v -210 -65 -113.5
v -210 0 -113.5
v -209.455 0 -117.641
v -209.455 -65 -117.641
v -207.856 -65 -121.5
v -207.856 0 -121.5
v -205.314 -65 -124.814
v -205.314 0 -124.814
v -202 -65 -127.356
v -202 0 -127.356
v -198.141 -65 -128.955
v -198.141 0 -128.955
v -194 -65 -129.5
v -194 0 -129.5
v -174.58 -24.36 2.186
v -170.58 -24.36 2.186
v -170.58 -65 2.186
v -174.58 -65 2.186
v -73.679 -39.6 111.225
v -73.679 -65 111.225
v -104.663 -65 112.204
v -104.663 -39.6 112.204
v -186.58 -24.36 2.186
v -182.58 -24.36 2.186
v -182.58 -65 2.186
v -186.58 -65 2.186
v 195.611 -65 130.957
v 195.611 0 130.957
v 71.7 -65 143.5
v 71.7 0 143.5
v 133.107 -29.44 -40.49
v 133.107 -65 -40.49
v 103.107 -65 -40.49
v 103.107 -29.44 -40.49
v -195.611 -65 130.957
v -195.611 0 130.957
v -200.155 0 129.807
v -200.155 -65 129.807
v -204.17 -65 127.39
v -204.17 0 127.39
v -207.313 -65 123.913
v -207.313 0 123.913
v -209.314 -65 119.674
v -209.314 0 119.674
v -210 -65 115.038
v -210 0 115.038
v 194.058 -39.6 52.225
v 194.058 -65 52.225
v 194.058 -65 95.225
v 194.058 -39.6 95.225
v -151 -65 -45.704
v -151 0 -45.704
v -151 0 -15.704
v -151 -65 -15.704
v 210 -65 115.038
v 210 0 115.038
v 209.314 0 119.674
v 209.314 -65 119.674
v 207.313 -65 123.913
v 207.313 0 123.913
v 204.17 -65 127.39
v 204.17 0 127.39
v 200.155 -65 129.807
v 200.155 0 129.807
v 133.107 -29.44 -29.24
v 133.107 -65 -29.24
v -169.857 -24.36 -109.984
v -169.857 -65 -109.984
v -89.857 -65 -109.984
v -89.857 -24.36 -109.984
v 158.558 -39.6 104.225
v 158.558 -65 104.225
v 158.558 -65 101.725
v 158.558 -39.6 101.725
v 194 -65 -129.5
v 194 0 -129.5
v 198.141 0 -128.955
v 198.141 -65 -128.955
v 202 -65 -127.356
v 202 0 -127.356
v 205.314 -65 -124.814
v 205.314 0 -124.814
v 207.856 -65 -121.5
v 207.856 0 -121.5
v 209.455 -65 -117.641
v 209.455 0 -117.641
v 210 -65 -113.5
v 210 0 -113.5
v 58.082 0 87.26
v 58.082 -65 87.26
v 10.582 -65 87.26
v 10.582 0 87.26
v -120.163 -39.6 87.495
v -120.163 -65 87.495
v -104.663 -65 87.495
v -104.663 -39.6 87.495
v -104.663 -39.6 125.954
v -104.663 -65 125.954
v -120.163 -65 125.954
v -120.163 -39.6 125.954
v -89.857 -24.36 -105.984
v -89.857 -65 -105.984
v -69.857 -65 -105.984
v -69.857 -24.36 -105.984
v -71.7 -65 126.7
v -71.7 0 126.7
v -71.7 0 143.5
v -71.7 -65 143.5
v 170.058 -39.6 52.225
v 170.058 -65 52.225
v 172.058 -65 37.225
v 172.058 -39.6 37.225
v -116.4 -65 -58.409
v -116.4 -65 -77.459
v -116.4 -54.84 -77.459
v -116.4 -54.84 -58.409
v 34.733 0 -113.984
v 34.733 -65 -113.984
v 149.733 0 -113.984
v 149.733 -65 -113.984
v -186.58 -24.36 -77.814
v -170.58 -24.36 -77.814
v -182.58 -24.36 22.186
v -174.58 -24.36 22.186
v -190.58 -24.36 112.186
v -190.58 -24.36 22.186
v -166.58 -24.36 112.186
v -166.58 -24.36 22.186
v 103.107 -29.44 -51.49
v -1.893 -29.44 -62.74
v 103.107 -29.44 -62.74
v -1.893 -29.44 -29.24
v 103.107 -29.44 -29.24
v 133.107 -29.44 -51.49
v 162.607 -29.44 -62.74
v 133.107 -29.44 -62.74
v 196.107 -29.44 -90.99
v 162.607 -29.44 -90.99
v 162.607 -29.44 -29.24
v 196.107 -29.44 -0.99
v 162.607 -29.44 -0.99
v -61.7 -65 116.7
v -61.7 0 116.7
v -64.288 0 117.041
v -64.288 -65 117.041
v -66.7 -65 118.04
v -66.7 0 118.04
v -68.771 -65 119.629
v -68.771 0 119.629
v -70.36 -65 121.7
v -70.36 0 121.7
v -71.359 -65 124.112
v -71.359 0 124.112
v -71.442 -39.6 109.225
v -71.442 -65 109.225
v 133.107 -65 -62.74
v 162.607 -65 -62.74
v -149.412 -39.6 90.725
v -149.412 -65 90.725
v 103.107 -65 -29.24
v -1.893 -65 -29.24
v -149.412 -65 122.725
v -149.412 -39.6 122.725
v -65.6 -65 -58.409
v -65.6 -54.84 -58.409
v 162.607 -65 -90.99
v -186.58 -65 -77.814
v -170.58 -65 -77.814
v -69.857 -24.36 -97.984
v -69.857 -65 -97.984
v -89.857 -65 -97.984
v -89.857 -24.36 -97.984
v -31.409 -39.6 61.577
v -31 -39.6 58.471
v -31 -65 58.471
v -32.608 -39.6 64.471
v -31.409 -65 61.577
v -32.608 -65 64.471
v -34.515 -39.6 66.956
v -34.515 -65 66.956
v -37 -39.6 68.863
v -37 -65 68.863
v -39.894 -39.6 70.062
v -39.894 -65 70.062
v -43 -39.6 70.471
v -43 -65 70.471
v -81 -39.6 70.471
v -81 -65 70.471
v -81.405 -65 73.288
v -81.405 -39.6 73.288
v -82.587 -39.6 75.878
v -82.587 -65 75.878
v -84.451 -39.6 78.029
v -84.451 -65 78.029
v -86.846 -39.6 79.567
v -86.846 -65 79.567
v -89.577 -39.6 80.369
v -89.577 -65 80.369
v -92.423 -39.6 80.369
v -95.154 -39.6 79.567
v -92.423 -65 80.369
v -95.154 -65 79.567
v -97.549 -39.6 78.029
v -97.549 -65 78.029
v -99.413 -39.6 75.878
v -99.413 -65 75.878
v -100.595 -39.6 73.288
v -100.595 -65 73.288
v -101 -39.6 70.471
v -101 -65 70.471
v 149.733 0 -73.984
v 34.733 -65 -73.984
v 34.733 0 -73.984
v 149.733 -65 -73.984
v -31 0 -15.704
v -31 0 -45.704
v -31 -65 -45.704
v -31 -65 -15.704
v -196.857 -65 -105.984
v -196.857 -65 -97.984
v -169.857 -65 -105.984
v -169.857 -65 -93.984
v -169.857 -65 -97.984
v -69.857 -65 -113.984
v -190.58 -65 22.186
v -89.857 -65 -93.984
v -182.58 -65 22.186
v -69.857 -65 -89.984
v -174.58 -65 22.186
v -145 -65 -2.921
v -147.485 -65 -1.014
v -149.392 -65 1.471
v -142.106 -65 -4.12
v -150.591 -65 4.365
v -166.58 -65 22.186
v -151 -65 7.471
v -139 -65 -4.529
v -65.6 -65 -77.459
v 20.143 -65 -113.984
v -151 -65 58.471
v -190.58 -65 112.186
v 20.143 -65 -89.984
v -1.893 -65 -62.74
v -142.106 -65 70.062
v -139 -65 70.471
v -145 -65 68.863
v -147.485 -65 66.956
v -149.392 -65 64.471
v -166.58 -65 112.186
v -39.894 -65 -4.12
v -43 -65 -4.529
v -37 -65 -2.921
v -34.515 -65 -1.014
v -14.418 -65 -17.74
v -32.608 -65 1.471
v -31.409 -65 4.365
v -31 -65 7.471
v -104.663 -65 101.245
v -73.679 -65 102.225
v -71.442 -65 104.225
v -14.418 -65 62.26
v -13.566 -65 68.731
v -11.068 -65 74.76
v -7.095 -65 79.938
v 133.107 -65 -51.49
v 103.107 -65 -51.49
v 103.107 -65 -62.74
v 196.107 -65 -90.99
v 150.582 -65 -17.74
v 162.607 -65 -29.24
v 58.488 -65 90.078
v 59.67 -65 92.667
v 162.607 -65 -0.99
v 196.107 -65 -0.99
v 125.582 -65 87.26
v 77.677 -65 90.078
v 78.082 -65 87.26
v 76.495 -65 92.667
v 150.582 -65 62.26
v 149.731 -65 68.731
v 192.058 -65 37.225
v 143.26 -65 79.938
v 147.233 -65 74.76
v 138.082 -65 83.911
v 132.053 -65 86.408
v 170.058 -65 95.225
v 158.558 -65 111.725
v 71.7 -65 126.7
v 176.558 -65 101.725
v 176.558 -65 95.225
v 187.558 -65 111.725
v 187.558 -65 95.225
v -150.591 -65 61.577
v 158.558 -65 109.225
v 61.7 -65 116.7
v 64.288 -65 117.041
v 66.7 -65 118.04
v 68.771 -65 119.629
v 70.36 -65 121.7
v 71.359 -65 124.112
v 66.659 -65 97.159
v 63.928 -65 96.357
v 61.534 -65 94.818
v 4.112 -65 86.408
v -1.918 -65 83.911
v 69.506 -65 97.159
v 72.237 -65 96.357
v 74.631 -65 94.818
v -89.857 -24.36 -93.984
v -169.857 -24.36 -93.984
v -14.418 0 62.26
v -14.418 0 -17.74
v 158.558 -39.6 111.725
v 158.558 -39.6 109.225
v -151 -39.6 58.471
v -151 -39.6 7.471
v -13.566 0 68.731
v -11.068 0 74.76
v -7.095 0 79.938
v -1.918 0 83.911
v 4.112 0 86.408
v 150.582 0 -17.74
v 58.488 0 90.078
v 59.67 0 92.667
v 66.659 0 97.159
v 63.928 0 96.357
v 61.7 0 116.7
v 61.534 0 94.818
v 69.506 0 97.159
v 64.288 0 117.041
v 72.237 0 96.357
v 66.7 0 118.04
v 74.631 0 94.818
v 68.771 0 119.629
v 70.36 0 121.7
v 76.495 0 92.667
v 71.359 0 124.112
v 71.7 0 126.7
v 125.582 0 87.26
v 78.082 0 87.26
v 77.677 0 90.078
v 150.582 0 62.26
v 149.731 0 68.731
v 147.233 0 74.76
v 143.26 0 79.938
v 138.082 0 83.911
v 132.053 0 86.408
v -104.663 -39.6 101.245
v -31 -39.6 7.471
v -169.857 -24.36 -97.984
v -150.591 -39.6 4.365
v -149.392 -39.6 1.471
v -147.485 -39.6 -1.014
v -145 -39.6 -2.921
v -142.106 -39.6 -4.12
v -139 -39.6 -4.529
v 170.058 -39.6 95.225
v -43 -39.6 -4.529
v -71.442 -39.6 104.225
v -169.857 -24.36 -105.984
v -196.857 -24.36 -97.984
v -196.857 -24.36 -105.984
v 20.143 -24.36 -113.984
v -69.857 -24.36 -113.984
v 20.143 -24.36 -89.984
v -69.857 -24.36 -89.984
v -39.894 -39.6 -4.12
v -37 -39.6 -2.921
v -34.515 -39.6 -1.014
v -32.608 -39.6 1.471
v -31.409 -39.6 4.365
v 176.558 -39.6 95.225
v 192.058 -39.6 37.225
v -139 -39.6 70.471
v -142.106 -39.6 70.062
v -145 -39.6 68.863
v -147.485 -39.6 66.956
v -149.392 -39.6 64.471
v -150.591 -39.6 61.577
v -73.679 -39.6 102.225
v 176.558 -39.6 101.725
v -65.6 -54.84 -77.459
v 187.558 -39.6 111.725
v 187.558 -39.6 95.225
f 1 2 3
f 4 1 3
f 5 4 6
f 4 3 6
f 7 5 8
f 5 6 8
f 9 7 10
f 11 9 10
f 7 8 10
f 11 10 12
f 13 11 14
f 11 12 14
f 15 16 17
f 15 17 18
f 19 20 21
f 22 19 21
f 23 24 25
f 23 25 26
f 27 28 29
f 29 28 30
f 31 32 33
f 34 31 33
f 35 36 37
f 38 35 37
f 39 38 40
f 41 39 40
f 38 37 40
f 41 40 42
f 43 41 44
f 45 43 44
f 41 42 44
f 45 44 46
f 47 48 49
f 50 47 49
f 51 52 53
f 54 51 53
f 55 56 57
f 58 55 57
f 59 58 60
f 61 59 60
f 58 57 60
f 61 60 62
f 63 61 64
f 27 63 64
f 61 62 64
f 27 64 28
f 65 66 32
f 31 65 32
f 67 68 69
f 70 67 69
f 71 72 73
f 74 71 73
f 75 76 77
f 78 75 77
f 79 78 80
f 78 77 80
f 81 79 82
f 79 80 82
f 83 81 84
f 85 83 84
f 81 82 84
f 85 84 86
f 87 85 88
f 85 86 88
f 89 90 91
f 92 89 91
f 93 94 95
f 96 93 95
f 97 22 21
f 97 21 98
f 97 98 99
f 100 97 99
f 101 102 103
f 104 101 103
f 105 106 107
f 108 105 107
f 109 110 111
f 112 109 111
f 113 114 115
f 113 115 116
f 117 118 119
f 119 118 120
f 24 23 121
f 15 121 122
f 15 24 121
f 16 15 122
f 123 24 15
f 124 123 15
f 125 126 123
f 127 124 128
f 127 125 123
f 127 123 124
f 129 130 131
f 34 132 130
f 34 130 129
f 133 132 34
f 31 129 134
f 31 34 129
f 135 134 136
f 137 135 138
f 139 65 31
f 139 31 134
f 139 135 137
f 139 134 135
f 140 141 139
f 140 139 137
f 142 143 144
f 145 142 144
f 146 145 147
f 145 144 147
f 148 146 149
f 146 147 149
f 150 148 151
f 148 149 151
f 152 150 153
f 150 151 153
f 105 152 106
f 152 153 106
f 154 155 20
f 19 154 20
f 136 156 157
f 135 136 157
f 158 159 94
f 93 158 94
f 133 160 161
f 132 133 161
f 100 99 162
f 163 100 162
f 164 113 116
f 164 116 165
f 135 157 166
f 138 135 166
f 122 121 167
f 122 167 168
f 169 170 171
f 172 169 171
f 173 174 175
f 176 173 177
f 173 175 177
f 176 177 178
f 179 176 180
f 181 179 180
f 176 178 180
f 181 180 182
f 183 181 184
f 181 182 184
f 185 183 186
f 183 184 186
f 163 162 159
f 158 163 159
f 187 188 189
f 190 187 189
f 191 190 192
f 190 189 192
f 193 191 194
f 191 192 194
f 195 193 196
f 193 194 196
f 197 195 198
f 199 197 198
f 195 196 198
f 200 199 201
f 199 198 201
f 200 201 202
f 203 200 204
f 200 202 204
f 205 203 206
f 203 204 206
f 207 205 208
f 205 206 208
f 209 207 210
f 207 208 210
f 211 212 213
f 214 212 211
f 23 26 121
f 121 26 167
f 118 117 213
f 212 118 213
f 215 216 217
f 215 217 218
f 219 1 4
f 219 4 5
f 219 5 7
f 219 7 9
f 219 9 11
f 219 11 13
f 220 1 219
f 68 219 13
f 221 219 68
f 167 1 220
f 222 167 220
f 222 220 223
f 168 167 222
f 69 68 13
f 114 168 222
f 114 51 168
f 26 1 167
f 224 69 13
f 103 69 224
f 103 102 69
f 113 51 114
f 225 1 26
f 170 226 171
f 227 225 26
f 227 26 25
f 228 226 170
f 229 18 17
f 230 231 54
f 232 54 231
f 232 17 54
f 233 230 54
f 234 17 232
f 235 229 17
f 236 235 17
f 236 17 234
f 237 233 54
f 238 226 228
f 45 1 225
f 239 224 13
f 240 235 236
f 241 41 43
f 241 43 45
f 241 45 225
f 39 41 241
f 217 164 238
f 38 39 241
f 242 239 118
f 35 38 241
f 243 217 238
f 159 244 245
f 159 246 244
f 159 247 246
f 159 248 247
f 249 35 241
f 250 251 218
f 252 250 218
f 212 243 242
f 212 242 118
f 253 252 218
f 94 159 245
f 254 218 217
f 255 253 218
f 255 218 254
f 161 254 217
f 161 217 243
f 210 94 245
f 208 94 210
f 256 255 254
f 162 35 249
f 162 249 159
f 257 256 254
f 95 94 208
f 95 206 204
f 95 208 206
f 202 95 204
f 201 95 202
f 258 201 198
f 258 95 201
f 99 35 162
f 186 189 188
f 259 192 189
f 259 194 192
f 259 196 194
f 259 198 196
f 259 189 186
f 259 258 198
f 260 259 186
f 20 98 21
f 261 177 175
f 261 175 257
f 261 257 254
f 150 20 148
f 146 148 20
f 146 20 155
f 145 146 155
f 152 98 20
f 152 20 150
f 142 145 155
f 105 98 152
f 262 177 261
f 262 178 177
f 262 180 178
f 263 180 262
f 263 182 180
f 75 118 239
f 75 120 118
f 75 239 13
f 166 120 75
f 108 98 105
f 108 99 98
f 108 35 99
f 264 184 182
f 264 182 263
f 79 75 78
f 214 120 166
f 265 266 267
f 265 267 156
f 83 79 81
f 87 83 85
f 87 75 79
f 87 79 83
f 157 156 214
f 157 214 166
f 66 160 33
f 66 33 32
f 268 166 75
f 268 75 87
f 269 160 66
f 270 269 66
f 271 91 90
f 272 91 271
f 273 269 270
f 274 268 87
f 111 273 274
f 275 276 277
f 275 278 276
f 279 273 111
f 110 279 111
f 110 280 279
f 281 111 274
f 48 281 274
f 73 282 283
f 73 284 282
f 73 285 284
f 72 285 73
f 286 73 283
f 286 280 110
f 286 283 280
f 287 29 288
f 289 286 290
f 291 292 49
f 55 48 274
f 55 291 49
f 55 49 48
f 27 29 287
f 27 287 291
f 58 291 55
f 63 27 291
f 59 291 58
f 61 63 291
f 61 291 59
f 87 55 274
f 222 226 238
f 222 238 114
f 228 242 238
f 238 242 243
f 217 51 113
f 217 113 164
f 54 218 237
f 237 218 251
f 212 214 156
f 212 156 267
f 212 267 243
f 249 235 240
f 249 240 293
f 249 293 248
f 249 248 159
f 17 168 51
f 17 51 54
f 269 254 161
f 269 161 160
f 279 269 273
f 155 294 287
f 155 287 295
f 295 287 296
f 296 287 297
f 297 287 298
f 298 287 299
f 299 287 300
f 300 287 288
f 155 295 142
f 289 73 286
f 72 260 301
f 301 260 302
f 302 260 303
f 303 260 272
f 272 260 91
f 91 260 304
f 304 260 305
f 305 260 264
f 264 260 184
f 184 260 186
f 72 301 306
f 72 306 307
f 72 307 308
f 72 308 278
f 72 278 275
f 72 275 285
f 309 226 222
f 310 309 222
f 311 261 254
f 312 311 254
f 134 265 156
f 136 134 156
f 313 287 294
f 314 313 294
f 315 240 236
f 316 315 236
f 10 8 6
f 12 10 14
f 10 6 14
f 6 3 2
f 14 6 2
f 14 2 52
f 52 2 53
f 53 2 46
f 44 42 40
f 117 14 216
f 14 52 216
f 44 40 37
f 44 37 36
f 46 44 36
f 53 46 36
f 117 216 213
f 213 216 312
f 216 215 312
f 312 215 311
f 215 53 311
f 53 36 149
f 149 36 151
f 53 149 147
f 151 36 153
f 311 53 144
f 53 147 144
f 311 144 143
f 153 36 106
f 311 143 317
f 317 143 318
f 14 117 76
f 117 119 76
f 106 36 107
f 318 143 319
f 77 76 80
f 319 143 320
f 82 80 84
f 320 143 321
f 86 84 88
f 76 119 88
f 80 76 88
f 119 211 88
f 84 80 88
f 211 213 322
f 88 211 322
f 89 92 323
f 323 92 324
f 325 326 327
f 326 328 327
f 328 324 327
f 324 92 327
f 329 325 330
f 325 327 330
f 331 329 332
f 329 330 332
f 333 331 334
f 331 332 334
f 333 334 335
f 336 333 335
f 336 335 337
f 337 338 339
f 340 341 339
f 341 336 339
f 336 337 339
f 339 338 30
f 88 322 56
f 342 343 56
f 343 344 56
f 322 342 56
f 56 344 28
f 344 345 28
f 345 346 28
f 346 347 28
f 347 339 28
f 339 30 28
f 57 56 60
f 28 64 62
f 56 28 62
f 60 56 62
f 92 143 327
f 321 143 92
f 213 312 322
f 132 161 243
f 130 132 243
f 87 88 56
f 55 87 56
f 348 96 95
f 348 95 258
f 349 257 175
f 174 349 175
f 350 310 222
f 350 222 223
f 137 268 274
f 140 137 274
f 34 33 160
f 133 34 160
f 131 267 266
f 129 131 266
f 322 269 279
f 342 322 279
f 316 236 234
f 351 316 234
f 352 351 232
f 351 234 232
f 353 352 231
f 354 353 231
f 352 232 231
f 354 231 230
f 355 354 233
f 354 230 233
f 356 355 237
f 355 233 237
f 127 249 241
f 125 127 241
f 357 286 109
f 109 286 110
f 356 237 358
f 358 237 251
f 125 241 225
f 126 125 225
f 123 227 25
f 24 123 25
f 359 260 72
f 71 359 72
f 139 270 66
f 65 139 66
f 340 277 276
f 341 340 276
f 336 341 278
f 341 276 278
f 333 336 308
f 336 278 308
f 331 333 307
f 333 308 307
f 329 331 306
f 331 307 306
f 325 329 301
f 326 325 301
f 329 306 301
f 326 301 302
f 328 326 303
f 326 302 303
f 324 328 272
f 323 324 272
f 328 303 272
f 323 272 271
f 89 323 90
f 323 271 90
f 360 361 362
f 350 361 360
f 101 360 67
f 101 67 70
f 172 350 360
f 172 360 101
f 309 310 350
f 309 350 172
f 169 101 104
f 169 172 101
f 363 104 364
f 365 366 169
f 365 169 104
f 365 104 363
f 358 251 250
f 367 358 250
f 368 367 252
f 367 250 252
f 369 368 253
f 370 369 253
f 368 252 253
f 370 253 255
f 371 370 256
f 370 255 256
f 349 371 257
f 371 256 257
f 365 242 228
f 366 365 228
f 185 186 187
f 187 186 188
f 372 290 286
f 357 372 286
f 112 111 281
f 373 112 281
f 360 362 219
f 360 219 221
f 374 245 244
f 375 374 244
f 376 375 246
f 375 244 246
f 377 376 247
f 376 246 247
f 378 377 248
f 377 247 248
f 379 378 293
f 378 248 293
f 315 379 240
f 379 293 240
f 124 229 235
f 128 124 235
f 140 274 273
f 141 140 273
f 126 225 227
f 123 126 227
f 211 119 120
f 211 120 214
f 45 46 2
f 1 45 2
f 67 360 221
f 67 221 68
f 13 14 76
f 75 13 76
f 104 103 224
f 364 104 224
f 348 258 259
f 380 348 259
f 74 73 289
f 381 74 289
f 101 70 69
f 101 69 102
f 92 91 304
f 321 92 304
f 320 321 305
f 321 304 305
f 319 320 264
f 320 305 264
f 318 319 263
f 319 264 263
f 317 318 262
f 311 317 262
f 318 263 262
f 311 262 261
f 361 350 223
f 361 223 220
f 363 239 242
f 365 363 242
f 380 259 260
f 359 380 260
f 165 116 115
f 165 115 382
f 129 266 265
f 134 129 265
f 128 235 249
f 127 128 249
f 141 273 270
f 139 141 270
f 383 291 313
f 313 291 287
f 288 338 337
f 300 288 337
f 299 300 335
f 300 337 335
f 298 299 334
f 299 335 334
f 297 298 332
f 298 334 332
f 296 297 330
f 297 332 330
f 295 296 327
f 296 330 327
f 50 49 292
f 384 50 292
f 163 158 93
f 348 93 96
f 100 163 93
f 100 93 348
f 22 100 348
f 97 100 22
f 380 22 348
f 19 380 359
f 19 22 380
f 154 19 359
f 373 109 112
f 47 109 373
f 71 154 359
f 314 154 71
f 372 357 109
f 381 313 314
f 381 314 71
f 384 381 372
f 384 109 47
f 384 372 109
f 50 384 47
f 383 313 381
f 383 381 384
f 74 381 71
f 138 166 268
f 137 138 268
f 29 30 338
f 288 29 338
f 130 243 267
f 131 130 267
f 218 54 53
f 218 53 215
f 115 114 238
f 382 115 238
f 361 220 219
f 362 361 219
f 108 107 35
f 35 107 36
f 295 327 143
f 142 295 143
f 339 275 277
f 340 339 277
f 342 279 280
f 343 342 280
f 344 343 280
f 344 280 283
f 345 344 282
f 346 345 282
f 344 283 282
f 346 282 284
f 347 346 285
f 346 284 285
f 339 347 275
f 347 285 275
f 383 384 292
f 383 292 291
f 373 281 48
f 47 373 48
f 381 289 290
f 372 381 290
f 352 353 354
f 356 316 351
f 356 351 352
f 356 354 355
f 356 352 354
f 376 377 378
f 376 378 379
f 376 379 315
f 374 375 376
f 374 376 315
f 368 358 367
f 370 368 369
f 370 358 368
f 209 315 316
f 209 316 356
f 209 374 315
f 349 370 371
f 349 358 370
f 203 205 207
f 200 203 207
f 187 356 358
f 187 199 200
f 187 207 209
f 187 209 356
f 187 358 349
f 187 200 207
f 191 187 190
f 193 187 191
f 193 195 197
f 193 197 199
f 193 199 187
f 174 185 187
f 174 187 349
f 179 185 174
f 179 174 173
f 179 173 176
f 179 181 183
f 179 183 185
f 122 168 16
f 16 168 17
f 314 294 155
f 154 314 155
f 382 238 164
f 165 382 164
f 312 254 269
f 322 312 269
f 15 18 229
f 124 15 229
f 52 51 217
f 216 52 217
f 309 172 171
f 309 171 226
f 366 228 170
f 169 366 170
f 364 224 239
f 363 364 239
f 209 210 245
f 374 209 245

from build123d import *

# Parameters (mm, degrees)
F1_DEPTH  = 65
F11_DEPTH = 65.001
F12_DEPTH = 25.4
F13_DEPTH = 35.56
F9_W      = 120
F9_H      = 30
F8_W      = 115
F8_H      = 40
F14_DEPTH = 65.001
F15_DEPTH = 25.4
F16_DEPTH = 40.64
F10_W     = 50.8
F10_H     = 19.05
F17_DEPTH = 10.16


# Not quite as in the source:
# - a length typed as a fraction of an inch, garbled in the dataset ("3 / 203.2 mm" for 3/8 in), is restored


with BuildPart() as f1:
    # F0 (on Front) → F1 (new body)
    with BuildSketch(Plane.XZ):
        with BuildLine():
            Line((-194, -129.5), (0, -129.5))
            Line((0, -129.5), (194, -129.5))
            ThreePointArc((194, -129.5), (205.313708499, -124.813708499), (210, -113.5))
            Line((210, -113.5), (210, 115.0378975104))
            ThreePointArc((210, 115.0378975104), (205.8697706725, 125.76676251), (195.6114319773, 130.9565434007))
            Line((195.6114319773, 130.9565434007), (71.7, 143.5))
            Line((71.7, 143.5), (71.7, 126.7))
            ThreePointArc((71.7, 126.7), (68.7710678119, 119.6289321881), (61.7, 116.7))
            Line((61.7, 116.7), (0, 116.7))
            Line((0, 116.7), (-61.7, 116.7))
            ThreePointArc((-61.7, 116.7), (-68.7710678119, 119.6289321881), (-71.7, 126.7))
            Line((-71.7, 126.7), (-71.7, 143.5))
            Line((-71.7, 143.5), (-195.6114319773, 130.9565434007))
            ThreePointArc((-195.6114319773, 130.9565434007), (-205.8697706725, 125.76676251), (-210, 115.0378975104))
            Line((-210, 115.0378975104), (-210, -113.5))
            ThreePointArc((-210, -113.5), (-205.313708499, -124.813708499), (-194, -129.5))
        make_face()
    extrude(amount=F1_DEPTH)

    # F10 (on face) → F11 (cut, through all)
    with BuildSketch(Plane.XZ.offset(65)):
        with BuildLine():
            Line((-14.4175440073, -17.7396814525), (55.0347959064, -17.7396814525))
            Line((55.0347959064, -17.7396814525), (150.5824559927, -17.7396814525))
            Line((150.5824559927, -17.7396814525), (150.5824559927, 62.2603185475))
            ThreePointArc((150.5824559927, 62.2603185475), (143.2601255224, 79.9379880772), (125.5824559927, 87.2603185475))
            Line((125.5824559927, 87.2603185475), (78.0824559927, 87.2603185475))
            ThreePointArc((78.0824559927, 87.2603185475), (68.0824559927, 97.2603185475), (58.0824559927, 87.2603185475))
            Line((58.0824559927, 87.2603185475), (10.5824559927, 87.2603185475))
            ThreePointArc((10.5824559927, 87.2603185475), (-7.095213537, 79.9379880772), (-14.4175440073, 62.2603185475))
            Line((-14.4175440073, 62.2603185475), (-14.4175440073, -17.7396814525))
        make_face()
    extrude(amount=-F11_DEPTH, mode=Mode.SUBTRACT)

    # F3 (on face) → F12 (cut)
    with BuildSketch(Plane.XZ.offset(65)):
        with BuildLine():
            ThreePointArc((-151, 7.4711079597), (-147.4852813742, -1.0141734145), (-139, -4.5288920403))
            Line((-139, -4.5288920403), (-101.0147116184, -4.5288920403))
            Line((-101.0147116184, -4.5288920403), (-43, -4.5288920403))
            ThreePointArc((-43, -4.5288920403), (-34.5147186258, -1.0141734145), (-31, 7.4711079597))
            Line((-31, 7.4711079597), (-31, 58.4711079597))
            ThreePointArc((-31, 58.4711079597), (-34.5147186258, 66.956389334), (-43, 70.4711079597))
            Line((-43, 70.4711079597), (-81, 70.4711079597))
            ThreePointArc((-81, 70.4711079597), (-91, 80.4711079597), (-101, 70.4711079597))
            Line((-101, 70.4711079597), (-139, 70.4711079597))
            ThreePointArc((-139, 70.4711079597), (-147.4852813742, 66.956389334), (-151, 58.4711079597))
            Line((-151, 58.4711079597), (-151, 7.4711079597))
        make_face()
    extrude(amount=-F12_DEPTH, mode=Mode.SUBTRACT)

    # F4 (on face) → F13 (cut)
    with BuildSketch(Plane.XZ.offset(65)):
        Polygon((162.6070588827, -90.9896814525), (196.1070588827, -90.9896814525), (196.1070588827, -45.9896814525), (196.1070588827, -0.9896814525), (162.6070588827, -0.9896814525), (162.6070588827, -29.2396814525), (133.1070588827, -29.2396814525), (133.1070588827, -40.4896814525), (103.1070588827, -40.4896814525), (103.1070588827, -29.2396814525), (-1.8929411173, -29.2396814525), (-1.8929411173, -45.9896814525), (-1.8929411173, -62.7396814525), (103.1070588827, -62.7396814525), (103.1070588827, -51.4896814525), (133.1070588827, -51.4896814525), (133.1070588827, -62.7396814525), (162.6070588827, -62.7396814525), align=None)
    extrude(amount=-F13_DEPTH, mode=Mode.SUBTRACT)

    # F9 (on face) + F8 (on face) → F14 (cut, through all)
    with BuildSketch(Plane.XZ.offset(65)):
        with Locations((-91, -30.7038457692)):
            Rectangle(F9_W, F9_H)
    with BuildSketch(Plane.XZ.offset(65)):
        with Locations((92.2330532188, -93.9844995737)):
            Rectangle(F8_W, F8_H)
    extrude(amount=-F14_DEPTH, mode=Mode.SUBTRACT)

    # F7 (on face) → F15 (cut)
    with BuildSketch(Plane.XZ.offset(65)):
        Polygon((-149.4115442038, 122.7246001363), (-149.4115442038, 106.7246001363), (-149.4115442038, 90.7246001363), (-120.1630565758, 87.4952884788), (-104.6630565758, 87.4952884788), (-104.6630565758, 101.2452884788), (-73.6785290068, 102.2246001363), (-71.4424610293, 104.2246001363), (158.5575389707, 104.2246001363), (158.5575389707, 101.7246001363), (176.5575389707, 101.7246001363), (176.5575389707, 95.2246001363), (170.0575389707, 95.2246001363), (170.0575389707, 52.2246001363), (172.0575389707, 37.2246001363), (182.0575389707, 37.2246001363), (192.0575389707, 37.2246001363), (194.0575389707, 52.2246001363), (194.0575389707, 95.2246001363), (187.5575389707, 95.2246001363), (187.5575389707, 111.7246001363), (158.5575389707, 111.7246001363), (158.5575389707, 109.2246001363), (-71.4424610293, 109.2246001363), (-73.6785290068, 111.2246001363), (-104.6630565758, 112.2039117938), (-104.6630565758, 125.9539117938), (-120.1630565758, 125.9539117938), align=None)
    extrude(amount=-F15_DEPTH, mode=Mode.SUBTRACT)

    # F7 (on face) + F5 (on face) → F16 (cut)
    with BuildSketch(Plane.XZ.offset(65)):
        Polygon((-89.8567122221, -93.9844995737), (-169.8567122221, -93.9844995737), (-169.8567122221, -97.9844995737), (-196.8567122221, -97.9844995737), (-196.8567122221, -101.9844995737), (-196.8567122221, -105.9844995737), (-169.8567122221, -105.9844995737), (-169.8567122221, -109.9844995737), (-89.8567122221, -109.9844995737), (-89.8567122221, -105.9844995737), (-69.8567122221, -105.9844995737), (-69.8567122221, -113.9844995737), (20.1432877779, -113.9844995737), (20.1432877779, -101.9844995737), (20.1432877779, -89.9844995737), (-69.8567122221, -89.9844995737), (-69.8567122221, -97.9844995737), (-89.8567122221, -97.9844995737), align=None)
    with BuildSketch(Plane.XZ.offset(65)):
        Polygon((-186.5798817873, 2.1856421232), (-186.5798817873, -77.8143578768), (-178.5798817873, -77.8143578768), (-170.5798817873, -77.8143578768), (-170.5798817873, 2.1856421232), (-174.5798817873, 2.1856421232), (-174.5798817873, 22.1856421232), (-166.5798817873, 22.1856421232), (-166.5798817873, 112.1856421232), (-178.5798817873, 112.1856421232), (-190.5798817873, 112.1856421232), (-190.5798817873, 22.1856421232), (-182.5798817873, 22.1856421232), (-182.5798817873, 2.1856421232), align=None)
    extrude(amount=-F16_DEPTH, mode=Mode.SUBTRACT)

    # F10 (on face) → F17 (cut)
    with BuildSketch(Plane.XZ.offset(65)):
        with Locations((-91, -67.9338675678)):
            Rectangle(F10_W, F10_H)
    extrude(amount=-F17_DEPTH, mode=Mode.SUBTRACT)


solid = f1.part
